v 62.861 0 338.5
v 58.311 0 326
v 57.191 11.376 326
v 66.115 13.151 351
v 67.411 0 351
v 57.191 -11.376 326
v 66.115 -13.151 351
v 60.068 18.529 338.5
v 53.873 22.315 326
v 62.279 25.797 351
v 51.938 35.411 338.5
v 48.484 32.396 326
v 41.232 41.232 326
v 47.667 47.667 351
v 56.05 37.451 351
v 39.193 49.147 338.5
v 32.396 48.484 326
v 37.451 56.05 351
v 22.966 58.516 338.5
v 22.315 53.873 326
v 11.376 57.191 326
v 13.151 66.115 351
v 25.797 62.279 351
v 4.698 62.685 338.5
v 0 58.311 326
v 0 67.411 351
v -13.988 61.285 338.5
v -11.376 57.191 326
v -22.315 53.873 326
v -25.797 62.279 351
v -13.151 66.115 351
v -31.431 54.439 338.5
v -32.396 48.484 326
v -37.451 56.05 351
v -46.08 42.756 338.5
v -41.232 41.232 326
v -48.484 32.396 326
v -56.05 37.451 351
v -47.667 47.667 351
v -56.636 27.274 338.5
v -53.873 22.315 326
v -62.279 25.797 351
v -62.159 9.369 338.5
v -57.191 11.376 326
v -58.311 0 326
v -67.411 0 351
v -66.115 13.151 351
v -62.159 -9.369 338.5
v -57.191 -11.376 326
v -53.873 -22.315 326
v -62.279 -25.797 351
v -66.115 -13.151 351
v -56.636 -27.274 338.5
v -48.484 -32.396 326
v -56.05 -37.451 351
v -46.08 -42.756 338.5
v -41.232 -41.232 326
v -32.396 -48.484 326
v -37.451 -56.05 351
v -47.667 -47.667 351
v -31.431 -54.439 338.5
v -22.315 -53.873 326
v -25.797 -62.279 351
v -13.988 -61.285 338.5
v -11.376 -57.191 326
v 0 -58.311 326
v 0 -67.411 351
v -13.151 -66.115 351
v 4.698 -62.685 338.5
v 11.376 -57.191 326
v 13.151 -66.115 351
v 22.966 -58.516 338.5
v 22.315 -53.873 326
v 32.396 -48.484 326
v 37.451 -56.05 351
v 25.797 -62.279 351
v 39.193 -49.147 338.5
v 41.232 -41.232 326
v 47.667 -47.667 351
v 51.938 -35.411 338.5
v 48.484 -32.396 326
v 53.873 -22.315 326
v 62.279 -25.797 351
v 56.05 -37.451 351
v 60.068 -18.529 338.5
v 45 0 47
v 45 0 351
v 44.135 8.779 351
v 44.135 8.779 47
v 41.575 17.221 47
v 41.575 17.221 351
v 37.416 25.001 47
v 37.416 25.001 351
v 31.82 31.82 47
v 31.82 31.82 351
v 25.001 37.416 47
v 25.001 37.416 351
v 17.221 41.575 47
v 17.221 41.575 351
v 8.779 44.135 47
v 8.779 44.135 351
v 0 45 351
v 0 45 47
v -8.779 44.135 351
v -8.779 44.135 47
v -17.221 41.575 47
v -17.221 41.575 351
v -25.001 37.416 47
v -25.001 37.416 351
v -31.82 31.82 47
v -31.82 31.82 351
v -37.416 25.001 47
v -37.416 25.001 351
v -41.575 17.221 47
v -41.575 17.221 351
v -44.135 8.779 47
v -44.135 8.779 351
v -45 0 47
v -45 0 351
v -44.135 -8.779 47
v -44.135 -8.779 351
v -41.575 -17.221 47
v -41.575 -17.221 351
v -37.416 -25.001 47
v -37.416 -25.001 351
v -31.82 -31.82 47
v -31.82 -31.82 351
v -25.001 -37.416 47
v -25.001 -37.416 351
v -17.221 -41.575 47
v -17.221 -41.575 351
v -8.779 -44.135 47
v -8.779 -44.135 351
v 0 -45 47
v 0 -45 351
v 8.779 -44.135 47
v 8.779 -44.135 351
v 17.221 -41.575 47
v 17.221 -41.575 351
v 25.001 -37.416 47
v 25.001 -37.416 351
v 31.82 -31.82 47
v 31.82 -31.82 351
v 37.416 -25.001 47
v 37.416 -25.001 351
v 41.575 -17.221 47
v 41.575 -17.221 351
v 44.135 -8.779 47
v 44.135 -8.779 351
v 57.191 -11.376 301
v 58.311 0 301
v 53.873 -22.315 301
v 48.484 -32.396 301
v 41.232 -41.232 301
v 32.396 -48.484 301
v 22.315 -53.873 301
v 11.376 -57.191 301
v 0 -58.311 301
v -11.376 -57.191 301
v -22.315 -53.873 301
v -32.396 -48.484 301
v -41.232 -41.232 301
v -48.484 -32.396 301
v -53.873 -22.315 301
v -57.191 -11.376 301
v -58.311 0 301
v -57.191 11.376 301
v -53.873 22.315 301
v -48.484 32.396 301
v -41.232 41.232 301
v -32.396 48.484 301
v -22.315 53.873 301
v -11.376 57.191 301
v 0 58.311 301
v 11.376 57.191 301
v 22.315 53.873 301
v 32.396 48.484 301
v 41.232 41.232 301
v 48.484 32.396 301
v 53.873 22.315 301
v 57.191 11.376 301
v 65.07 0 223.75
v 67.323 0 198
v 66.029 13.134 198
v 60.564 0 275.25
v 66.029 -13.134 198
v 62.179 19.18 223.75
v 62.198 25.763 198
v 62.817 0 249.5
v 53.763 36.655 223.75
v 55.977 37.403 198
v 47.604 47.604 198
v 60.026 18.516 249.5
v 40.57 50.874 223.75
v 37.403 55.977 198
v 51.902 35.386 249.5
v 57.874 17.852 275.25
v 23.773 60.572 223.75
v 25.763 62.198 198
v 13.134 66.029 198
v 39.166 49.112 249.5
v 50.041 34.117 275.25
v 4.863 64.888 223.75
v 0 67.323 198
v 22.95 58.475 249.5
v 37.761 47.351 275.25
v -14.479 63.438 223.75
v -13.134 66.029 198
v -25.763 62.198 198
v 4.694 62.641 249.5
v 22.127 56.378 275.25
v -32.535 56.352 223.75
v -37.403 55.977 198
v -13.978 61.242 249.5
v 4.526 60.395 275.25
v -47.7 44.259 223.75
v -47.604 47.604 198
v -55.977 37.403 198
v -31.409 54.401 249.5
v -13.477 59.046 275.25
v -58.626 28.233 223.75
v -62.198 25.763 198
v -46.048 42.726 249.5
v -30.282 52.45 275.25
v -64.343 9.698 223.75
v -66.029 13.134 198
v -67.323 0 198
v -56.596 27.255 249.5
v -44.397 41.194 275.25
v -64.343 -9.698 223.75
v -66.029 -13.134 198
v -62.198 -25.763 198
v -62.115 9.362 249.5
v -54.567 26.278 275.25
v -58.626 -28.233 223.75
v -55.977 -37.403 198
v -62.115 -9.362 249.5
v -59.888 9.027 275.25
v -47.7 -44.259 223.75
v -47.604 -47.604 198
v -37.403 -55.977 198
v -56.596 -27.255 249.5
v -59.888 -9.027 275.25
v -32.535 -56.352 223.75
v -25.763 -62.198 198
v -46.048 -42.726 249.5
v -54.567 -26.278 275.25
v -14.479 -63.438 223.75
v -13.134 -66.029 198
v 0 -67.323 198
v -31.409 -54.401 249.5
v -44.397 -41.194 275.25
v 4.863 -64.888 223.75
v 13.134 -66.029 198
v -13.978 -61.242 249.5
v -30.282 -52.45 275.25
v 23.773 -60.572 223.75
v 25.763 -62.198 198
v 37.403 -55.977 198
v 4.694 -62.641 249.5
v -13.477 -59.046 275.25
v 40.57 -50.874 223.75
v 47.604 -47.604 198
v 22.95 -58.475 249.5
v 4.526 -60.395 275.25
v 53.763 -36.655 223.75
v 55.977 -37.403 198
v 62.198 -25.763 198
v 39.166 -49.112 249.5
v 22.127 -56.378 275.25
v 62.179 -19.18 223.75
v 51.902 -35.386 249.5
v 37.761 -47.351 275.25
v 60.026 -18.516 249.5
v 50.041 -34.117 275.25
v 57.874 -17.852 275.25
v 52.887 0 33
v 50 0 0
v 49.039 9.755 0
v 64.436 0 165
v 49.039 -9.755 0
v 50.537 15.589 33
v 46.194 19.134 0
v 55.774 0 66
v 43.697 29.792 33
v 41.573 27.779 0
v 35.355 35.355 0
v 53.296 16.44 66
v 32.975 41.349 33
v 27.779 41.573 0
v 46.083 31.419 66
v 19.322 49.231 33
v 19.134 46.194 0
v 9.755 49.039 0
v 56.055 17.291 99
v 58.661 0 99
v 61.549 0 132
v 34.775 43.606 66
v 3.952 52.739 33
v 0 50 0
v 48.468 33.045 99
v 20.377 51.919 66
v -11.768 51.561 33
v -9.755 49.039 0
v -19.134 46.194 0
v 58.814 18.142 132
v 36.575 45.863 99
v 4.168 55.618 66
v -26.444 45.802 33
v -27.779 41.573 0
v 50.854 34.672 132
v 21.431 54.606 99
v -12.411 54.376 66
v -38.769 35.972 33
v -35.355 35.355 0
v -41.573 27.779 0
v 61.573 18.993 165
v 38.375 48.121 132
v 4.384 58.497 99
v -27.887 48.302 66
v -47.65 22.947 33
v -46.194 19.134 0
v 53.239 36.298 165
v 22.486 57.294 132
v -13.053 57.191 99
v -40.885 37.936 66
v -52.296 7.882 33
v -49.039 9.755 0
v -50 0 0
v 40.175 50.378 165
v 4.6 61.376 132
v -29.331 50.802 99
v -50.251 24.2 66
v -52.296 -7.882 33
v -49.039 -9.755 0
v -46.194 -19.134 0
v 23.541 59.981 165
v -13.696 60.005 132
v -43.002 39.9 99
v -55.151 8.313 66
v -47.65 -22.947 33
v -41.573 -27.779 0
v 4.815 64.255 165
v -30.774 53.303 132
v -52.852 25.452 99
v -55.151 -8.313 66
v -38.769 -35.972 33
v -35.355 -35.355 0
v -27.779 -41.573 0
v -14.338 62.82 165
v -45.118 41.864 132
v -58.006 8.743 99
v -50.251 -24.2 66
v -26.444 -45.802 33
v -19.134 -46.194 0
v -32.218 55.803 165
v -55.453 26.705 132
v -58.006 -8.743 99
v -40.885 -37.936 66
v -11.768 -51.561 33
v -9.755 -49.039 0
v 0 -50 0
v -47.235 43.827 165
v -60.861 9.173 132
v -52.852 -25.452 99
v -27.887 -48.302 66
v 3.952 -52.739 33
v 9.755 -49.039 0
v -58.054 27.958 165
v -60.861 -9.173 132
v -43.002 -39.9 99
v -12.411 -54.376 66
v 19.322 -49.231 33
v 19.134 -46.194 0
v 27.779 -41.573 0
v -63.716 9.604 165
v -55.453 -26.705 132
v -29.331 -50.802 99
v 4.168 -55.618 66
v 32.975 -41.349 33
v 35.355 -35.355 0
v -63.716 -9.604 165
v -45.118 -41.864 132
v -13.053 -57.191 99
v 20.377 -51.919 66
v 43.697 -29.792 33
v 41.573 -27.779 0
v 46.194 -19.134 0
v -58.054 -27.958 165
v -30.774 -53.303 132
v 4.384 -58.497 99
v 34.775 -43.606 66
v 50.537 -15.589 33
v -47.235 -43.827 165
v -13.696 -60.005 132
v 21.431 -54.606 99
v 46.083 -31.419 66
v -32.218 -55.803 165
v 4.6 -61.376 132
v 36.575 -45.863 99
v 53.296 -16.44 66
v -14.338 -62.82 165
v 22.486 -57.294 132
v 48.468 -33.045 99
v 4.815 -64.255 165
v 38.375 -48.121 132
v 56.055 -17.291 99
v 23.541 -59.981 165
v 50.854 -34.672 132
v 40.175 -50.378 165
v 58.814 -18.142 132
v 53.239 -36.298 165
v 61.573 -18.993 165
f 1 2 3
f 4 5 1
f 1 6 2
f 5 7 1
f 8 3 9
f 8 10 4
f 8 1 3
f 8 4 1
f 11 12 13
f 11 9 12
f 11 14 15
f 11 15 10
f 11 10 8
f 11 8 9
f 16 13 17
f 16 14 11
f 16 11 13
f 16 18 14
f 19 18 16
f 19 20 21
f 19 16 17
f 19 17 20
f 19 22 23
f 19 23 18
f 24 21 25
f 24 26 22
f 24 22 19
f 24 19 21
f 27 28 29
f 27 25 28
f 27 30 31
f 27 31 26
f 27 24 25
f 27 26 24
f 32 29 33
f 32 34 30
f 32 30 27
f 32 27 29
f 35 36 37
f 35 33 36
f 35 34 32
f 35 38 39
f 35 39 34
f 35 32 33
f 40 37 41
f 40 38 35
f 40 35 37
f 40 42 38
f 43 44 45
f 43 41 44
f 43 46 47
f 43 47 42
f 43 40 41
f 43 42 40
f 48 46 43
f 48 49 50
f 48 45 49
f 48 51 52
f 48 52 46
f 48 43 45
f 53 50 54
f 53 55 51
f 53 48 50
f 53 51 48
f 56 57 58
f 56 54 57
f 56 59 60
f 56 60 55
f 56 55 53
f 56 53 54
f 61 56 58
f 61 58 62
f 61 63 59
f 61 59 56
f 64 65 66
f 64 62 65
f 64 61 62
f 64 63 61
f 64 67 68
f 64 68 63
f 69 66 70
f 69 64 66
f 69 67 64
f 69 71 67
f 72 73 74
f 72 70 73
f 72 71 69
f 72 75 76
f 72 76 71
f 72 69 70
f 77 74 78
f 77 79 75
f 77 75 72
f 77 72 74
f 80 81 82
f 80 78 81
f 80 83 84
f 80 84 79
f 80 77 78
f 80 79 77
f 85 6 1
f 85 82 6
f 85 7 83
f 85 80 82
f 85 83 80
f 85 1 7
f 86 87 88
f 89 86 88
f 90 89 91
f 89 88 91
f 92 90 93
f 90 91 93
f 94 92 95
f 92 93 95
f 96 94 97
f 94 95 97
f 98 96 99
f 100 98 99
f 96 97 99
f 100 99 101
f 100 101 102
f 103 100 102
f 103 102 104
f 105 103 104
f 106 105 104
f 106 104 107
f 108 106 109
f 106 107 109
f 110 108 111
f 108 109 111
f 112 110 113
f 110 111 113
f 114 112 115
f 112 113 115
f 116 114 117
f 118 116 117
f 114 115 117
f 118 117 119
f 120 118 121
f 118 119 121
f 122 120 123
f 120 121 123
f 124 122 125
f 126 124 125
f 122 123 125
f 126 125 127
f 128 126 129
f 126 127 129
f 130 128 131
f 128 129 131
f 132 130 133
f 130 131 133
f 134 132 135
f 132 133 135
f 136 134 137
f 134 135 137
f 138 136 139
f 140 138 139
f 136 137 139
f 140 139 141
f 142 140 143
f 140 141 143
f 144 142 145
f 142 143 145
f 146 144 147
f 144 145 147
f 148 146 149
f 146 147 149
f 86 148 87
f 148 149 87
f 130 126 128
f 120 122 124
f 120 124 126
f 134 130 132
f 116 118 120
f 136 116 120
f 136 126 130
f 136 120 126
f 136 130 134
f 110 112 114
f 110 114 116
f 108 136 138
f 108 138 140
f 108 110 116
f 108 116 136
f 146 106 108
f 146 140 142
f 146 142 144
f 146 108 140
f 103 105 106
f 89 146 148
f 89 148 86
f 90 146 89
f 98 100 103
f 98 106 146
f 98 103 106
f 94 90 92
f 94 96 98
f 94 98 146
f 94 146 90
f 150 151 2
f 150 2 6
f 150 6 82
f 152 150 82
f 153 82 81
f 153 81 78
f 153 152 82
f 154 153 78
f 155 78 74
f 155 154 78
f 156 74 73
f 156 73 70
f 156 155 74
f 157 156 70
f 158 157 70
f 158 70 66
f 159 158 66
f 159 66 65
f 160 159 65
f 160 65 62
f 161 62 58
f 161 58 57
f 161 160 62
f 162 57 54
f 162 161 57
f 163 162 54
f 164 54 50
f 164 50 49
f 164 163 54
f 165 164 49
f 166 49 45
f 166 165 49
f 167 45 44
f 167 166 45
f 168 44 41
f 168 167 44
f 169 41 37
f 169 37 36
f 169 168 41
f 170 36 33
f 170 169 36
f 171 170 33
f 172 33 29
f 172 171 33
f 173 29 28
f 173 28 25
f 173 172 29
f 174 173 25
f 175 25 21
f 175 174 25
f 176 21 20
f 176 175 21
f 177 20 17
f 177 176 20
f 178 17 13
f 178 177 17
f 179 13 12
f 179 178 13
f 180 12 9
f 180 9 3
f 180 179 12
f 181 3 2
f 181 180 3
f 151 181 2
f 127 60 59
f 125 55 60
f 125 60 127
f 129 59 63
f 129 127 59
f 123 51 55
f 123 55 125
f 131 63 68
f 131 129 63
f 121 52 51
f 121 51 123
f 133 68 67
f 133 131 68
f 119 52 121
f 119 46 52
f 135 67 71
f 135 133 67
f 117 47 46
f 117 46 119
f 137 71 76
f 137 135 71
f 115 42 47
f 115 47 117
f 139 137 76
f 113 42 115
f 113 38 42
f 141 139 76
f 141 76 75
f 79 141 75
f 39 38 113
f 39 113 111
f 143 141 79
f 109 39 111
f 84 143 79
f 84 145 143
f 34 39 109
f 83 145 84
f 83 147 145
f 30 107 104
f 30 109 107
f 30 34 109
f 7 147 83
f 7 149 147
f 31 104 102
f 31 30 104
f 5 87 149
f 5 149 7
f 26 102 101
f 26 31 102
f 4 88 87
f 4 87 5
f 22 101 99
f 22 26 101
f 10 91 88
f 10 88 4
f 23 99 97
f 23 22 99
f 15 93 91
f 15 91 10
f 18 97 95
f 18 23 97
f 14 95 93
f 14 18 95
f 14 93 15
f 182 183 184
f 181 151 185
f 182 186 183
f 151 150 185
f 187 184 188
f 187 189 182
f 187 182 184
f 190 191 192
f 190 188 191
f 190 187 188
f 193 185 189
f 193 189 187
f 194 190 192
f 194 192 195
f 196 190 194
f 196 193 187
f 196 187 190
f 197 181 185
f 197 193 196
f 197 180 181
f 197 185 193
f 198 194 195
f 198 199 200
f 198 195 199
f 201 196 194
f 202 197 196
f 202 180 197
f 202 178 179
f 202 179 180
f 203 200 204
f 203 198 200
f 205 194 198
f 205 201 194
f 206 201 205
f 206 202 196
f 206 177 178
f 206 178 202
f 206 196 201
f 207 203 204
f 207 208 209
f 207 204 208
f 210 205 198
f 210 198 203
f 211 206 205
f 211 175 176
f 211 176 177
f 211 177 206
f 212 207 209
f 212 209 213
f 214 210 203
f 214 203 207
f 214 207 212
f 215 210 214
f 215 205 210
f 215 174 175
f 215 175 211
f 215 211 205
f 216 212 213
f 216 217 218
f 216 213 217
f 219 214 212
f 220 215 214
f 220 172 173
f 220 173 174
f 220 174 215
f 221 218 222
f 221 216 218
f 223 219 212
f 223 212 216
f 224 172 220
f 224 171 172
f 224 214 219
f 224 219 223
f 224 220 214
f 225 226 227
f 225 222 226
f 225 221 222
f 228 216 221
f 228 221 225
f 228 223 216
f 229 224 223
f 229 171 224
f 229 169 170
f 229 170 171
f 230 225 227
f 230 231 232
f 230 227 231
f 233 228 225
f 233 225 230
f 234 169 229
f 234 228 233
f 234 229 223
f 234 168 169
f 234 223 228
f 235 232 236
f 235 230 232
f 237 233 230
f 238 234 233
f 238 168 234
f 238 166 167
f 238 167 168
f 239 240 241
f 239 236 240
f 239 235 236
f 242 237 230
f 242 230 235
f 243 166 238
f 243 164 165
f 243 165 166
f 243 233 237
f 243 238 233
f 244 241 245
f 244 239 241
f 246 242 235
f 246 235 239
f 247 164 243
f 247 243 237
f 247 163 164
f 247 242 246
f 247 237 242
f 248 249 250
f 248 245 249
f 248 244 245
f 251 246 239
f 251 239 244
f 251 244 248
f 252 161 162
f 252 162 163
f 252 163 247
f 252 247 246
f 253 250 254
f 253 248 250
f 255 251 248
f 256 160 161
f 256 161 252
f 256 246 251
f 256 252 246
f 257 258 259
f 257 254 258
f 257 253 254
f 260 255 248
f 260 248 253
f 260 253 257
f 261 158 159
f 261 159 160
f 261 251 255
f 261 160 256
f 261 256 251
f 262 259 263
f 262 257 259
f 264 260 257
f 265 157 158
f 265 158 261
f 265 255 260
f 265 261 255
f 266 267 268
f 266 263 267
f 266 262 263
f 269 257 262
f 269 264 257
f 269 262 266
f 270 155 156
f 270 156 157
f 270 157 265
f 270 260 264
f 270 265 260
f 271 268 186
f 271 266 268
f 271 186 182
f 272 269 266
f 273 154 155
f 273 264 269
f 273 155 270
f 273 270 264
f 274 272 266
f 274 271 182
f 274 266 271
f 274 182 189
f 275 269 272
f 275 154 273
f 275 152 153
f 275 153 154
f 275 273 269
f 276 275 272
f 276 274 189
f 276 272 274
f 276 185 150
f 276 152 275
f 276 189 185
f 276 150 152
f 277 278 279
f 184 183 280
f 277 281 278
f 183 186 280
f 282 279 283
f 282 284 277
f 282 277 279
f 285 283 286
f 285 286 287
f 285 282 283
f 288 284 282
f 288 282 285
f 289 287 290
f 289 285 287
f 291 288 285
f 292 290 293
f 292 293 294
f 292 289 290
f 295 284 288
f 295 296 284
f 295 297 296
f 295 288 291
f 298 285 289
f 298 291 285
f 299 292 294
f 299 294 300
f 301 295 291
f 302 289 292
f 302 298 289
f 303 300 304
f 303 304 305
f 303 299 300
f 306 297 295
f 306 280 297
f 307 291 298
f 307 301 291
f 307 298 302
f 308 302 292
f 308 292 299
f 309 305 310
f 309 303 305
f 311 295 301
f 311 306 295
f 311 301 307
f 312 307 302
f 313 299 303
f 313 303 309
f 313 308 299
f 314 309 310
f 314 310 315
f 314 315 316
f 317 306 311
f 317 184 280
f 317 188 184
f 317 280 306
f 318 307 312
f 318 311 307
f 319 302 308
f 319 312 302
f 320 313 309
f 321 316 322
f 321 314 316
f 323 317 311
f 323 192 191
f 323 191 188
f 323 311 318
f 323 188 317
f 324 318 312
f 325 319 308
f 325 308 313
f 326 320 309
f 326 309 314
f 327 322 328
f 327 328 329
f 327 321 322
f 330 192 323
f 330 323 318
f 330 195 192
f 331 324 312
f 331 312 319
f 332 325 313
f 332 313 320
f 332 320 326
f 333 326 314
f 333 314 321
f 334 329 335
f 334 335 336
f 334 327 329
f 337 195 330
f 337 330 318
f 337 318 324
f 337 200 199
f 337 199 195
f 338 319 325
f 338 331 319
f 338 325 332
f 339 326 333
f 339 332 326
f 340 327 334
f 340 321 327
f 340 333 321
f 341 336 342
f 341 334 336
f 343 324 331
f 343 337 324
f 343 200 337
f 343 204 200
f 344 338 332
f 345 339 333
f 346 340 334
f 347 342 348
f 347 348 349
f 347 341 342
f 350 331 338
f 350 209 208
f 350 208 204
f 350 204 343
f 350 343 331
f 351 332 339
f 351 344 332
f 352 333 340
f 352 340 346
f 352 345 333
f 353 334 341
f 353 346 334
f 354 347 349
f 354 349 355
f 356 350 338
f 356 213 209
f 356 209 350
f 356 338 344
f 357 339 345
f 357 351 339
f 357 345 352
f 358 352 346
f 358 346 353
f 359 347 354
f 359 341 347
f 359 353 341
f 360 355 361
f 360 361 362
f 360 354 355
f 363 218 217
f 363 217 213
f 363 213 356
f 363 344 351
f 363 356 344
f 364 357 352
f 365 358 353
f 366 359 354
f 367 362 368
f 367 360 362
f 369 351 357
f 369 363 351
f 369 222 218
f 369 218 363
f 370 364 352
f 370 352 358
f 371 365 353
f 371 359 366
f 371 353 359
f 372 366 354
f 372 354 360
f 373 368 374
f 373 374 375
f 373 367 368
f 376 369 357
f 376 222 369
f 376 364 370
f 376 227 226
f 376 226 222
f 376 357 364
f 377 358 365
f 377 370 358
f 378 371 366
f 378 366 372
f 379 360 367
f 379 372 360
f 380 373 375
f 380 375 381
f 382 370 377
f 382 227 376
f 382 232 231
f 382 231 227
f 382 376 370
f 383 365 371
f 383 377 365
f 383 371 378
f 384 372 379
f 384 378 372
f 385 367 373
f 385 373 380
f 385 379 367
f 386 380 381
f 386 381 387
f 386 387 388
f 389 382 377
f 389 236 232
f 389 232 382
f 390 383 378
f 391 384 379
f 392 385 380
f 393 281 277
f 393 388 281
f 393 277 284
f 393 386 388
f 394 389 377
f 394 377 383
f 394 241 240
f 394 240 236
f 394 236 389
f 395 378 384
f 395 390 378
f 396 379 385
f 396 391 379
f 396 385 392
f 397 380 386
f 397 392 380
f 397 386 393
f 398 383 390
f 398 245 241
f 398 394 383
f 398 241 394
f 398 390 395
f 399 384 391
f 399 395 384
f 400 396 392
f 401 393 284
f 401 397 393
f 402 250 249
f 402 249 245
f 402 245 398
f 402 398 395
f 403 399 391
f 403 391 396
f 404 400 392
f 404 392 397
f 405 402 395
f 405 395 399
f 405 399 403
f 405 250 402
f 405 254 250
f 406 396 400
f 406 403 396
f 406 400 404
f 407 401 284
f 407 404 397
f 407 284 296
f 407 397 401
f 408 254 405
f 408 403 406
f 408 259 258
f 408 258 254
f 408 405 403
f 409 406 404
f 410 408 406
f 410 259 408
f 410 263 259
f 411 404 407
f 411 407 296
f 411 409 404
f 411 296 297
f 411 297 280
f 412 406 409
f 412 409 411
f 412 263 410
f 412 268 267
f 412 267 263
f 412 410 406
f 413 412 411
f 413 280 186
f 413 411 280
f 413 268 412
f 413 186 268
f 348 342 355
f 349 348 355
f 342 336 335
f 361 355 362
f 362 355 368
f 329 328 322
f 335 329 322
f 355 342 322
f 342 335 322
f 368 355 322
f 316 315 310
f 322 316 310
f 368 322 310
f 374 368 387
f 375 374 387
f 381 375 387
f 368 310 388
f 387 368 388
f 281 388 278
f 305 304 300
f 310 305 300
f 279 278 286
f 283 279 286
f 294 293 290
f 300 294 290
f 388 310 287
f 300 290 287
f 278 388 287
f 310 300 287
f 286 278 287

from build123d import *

# Parameters (mm, degrees)
F0_R      = 50
F1_DEPTH  = 198
F1_TAPER  = -5
F1_FACE_R = 67.3227553781
F2_DEPTH  = 103
F2_TAPER  = 5
F3_DEPTH  = 25
F3_FACE_R = 58.311423035
F4_DEPTH  = 25
F4_TAPER  = -20
F5_R      = 45
F6_DEPTH  = 304


with BuildPart() as f1:
    # F0 (on Top) → F1 (new body)
    with BuildSketch(Plane.XY):
        Circle(F0_R)
    extrude(amount=F1_DEPTH, taper=F1_TAPER)

    # F1_face (on face) → F2 (join)
    with BuildSketch(Plane.XY.offset(198)):
        Circle(F1_FACE_R)
    extrude(amount=F2_DEPTH, taper=F2_TAPER)

    # F3 (add): a face of the model
    f3_faces = [f1.faces().sort_by_distance(p)[0] for p in [
        (0, 0, 301),
    ]]
    extrude(f3_faces, amount=F3_DEPTH)

    # F3_face (on face) → F4 (join)
    with BuildSketch(Plane.XY.offset(326)):
        Circle(F3_FACE_R)
    extrude(amount=F4_DEPTH, taper=F4_TAPER)

    # F5 (on face) → F6 (cut)
    with BuildSketch(Plane.XY.offset(351)):
        Circle(F5_R)
    extrude(amount=-F6_DEPTH, mode=Mode.SUBTRACT)


solid = f1.part
